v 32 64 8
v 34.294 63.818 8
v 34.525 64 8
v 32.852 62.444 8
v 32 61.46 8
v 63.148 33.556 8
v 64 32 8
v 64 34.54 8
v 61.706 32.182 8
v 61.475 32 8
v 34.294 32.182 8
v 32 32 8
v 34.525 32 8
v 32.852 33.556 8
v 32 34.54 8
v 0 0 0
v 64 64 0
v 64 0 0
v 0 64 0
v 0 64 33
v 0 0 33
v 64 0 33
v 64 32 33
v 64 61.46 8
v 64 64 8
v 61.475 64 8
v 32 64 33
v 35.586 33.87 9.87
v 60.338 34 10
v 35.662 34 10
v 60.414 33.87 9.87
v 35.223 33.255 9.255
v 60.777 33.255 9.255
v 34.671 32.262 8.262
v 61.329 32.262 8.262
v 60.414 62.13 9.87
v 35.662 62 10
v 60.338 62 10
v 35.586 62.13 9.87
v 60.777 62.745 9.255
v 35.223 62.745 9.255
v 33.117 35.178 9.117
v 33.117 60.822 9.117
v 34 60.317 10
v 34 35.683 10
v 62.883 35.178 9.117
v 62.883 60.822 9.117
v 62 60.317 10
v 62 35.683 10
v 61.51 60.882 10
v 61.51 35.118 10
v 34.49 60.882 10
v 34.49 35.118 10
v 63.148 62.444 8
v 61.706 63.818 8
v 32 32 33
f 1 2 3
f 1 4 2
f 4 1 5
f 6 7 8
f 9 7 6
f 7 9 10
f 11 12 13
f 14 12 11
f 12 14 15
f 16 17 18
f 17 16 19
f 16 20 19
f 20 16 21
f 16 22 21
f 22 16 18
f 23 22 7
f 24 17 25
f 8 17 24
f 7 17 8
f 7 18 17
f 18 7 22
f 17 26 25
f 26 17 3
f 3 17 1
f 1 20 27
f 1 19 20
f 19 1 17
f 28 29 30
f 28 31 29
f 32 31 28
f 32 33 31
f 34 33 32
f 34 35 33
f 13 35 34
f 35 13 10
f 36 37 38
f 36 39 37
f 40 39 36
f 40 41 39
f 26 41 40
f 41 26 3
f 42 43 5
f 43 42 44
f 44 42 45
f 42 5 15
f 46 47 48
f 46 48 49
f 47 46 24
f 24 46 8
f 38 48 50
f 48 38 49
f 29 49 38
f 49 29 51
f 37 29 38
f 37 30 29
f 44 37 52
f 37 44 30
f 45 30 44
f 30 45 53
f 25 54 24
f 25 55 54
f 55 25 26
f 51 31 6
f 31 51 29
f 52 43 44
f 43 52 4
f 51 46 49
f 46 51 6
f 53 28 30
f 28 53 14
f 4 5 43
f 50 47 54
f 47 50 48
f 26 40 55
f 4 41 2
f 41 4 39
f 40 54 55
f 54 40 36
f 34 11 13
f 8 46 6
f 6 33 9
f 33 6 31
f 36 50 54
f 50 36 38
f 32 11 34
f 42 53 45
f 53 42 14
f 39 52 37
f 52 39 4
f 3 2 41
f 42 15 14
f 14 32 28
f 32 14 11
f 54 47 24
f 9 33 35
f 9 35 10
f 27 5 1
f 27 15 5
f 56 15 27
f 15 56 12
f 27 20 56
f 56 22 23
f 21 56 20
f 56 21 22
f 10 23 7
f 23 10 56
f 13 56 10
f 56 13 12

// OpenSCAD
// file: ModularDungeonTileLibrary.scad
//Constants
wallleft = 0;
wallbottom = 1;
wallright = 2;
walltop = 3;
wallcenter = 4;
walldoubleright = 5;


//Variables
size = 32;
connectorlength = size-10;
connectorwidth = 6;
connectorheight = 4;
baseheight = 8;
topperheight = 2;
topperrounded = true;
walllength = size;
wallheight = 25;
wallwidth = 6;
wallwidththin = 4;


//Functions
function hypotenuse_ra(side_a, side_b) =
    sqrt(pow(side_a, 2) + pow(side_b, 2));
    
    
//Modules    
module mtdl_Base_Connector(cw,cl,ch) {
    translate([-connectorwidth/2,-connectorlength/2,-connectorheight/2]) {
        cube([cw,cl,ch/2]);
        translate([cw/3,0,ch/2])
            cube([cw/3,cl,ch/2]);
        translate([-(cw-2)/2,cl/2-2,0])
            cube([cw+4,4,ch]);
    }
}

module mdtl_Base(s,bh)
{
    cube([s,s,bh]);
}

module mdtl_Topper(s,bh,th,tr)
{
    if (tr) {
        translate([0,0,bh])
            intersection() {
                difference () {
                        cube([s,s,th]);
                        union () {
                        rotate(a=45, v=[1,0,0])
                            cube([s,th*2,th*2]);
                        translate([0,s,0])
                            rotate(a=45, v=[1,0,0])
                                cube([s,th*2,th*2]);
                        rotate(a=-45, v=[0,1,0])
                            cube([th*2,s,th*2]);
                        translate([s,0,0])
                            rotate(a=-45, v=[0,1,0])
                                cube([th*2,s,th*2]);
                        }
                }
                translate([s/2,s/2,0])
                    cylinder(
                        h=th, 
                        r1=hypotenuse_ra(s/2-1.2, s/2-1.2), 
                        r2=hypotenuse_ra(s/2-th-.8, s/2-th-.8), 
                        center=false, 
                        $fa=.1);
            }    
    }
    else {
        translate([0,0,bh])
            difference() {
                cube([s,s,th]);
                union () {
                rotate(a=45, v=[1,0,0])
                    cube([s,th*2,th*2]);
                translate([0,s,0])
                    rotate(a=45, v=[1,0,0])
                        cube([s,th*2,th*2]);
                rotate(a=-45, v=[0,1,0])
                    cube([th*2,s,th*2]);
                translate([s,0,0])
                    rotate(a=-45, v=[0,1,0])
                        cube([th*2,s,th*2]);
                }
            }    
    }
}

module mdtl_Base_1x1(s,bh,th,tr) 
{
    difference () {
        union () {
            mdtl_Base(s,bh);
            mdtl_Topper(s,bh,th,tr);
        }
//        union () {
//            translate([size/2,size,baseheight/2])
//                rotate([0,180,0])
//                    mtdl_Base_Connector(connectorwidth,connectorlength,connectorheight);
//            translate([size/2,0,baseheight/2])
//                rotate([0,180,0])
//                    mtdl_Base_Connector(connectorwidth,connectorlength,connectorheight);
//            translate([size,size/2,baseheight/2])
//                rotate([0,180,90])
//                    mtdl_Base_Connector(connectorwidth,connectorlength,connectorheight);
//            translate([0,size/2,baseheight/2])
//                rotate([0,180,90])
//                    mtdl_Base_Connector(connectorwidth,connectorlength,connectorheight);
//        }
    }
}

module mdtl_Base_1x2(s,bh,th,tr)
{
    union () {
        mdtl_Base_1x1(s,bh,th,tr);
        translate([s,0,0])
            mdtl_Base_1x1(s,bh,th,tr);
    }
}
 
module mdtl_Base_2x2(s,bh,th,tr)
{
    union () {
        mdtl_Base_1x2(s,bh,th,tr);
        translate([0,s,0])
            mdtl_Base_1x2(s,bh,th,tr);
    }
}
 
module mdtl_Base_2x4(s,bh,th,tr)
{
    union () {
        mdtl_Base_2x2(s,bh,th,tr);
        translate([s*2,0,0])
            mdtl_Base_2x2(s,bh,th,tr);
    }
}
 
module mdtl_Base_4x4(s,bh,th,tr)
{
    union () {
        mdtl_Base_2x4(s,bh,th,tr);
        translate([0,s*2,0])
            mdtl_Base_2x4(s,bh,th,tr);
    }
}
 
module mdtl_Wall_1(w,l,h)
{
    translate([0,0,baseheight])
        cube([w,l,h]);   
}

module mdtl_Wall_1_Position(w,l,h,p)
{
    if (p==0) {
        mdtl_Wall_1(w,l,h);
    }
    
    else if (p==1) {
        rotate(a=-90)
           translate([-w,0,0])
               mdtl_Wall_1(w,l,h);       
    }
    
    else if (p==2) {
        translate([(size)-w,0,0])
            mdtl_Wall_1(w,l,h);
    }
    
    else if (p==3) {
        rotate(a=-90)
            translate([-l,0,0])
                mdtl_Wall_1(w,l,h);
    }
    
    else if (p==4) {
        translate([(size)-w/2,0,0])
            mdtl_Wall_1(w,l,h);
    }
    
    else if (p==5) {
        translate([(size*2)-w,0,0])
           mdtl_Wall_1(w,l,h);       
    }
}

module mdtl_Wall_2(w,l,h)
{
    union() {
        mdtl_Wall_1(w,l,h);
        translate([0,l,0])
            mdtl_Wall_1(w,l,h);
    }
}

module mdtl_Wall_2_Position(w,l,h,p)
{
    if (p==0) {
        mdtl_Wall_2(w,l,h);
    }
    
    else if (p==1) {
        rotate(a=-90)
            translate([-w,0,0])
                mdtl_Wall_2(w,l,h);
    }
    
    else if (p==2) {
    translate([(size*2)-w,0,0])
        mdtl_Wall_2(w,l,h);
    }
    
    else if (p==3) {
        rotate(a=-90)
            translate([-l*2,0,0])
                mdtl_Wall_2(w,l,h);
    }
    
    else if (p==4) {
        translate([(size)-w/2,0,0])
            mdtl_Wall_2(w,l,h);
    }
}
// main file
include <ModularDungeonTileLibrary.scad>; 

mdtl_Base_2x2(size,baseheight,topperheight,topperrounded);
//Create Pillar with modified wall
mdtl_Wall_2_Position(size,size,wallheight,wallleft);
mdtl_Wall_2_Position(size,size/2,wallheight,wallright);
